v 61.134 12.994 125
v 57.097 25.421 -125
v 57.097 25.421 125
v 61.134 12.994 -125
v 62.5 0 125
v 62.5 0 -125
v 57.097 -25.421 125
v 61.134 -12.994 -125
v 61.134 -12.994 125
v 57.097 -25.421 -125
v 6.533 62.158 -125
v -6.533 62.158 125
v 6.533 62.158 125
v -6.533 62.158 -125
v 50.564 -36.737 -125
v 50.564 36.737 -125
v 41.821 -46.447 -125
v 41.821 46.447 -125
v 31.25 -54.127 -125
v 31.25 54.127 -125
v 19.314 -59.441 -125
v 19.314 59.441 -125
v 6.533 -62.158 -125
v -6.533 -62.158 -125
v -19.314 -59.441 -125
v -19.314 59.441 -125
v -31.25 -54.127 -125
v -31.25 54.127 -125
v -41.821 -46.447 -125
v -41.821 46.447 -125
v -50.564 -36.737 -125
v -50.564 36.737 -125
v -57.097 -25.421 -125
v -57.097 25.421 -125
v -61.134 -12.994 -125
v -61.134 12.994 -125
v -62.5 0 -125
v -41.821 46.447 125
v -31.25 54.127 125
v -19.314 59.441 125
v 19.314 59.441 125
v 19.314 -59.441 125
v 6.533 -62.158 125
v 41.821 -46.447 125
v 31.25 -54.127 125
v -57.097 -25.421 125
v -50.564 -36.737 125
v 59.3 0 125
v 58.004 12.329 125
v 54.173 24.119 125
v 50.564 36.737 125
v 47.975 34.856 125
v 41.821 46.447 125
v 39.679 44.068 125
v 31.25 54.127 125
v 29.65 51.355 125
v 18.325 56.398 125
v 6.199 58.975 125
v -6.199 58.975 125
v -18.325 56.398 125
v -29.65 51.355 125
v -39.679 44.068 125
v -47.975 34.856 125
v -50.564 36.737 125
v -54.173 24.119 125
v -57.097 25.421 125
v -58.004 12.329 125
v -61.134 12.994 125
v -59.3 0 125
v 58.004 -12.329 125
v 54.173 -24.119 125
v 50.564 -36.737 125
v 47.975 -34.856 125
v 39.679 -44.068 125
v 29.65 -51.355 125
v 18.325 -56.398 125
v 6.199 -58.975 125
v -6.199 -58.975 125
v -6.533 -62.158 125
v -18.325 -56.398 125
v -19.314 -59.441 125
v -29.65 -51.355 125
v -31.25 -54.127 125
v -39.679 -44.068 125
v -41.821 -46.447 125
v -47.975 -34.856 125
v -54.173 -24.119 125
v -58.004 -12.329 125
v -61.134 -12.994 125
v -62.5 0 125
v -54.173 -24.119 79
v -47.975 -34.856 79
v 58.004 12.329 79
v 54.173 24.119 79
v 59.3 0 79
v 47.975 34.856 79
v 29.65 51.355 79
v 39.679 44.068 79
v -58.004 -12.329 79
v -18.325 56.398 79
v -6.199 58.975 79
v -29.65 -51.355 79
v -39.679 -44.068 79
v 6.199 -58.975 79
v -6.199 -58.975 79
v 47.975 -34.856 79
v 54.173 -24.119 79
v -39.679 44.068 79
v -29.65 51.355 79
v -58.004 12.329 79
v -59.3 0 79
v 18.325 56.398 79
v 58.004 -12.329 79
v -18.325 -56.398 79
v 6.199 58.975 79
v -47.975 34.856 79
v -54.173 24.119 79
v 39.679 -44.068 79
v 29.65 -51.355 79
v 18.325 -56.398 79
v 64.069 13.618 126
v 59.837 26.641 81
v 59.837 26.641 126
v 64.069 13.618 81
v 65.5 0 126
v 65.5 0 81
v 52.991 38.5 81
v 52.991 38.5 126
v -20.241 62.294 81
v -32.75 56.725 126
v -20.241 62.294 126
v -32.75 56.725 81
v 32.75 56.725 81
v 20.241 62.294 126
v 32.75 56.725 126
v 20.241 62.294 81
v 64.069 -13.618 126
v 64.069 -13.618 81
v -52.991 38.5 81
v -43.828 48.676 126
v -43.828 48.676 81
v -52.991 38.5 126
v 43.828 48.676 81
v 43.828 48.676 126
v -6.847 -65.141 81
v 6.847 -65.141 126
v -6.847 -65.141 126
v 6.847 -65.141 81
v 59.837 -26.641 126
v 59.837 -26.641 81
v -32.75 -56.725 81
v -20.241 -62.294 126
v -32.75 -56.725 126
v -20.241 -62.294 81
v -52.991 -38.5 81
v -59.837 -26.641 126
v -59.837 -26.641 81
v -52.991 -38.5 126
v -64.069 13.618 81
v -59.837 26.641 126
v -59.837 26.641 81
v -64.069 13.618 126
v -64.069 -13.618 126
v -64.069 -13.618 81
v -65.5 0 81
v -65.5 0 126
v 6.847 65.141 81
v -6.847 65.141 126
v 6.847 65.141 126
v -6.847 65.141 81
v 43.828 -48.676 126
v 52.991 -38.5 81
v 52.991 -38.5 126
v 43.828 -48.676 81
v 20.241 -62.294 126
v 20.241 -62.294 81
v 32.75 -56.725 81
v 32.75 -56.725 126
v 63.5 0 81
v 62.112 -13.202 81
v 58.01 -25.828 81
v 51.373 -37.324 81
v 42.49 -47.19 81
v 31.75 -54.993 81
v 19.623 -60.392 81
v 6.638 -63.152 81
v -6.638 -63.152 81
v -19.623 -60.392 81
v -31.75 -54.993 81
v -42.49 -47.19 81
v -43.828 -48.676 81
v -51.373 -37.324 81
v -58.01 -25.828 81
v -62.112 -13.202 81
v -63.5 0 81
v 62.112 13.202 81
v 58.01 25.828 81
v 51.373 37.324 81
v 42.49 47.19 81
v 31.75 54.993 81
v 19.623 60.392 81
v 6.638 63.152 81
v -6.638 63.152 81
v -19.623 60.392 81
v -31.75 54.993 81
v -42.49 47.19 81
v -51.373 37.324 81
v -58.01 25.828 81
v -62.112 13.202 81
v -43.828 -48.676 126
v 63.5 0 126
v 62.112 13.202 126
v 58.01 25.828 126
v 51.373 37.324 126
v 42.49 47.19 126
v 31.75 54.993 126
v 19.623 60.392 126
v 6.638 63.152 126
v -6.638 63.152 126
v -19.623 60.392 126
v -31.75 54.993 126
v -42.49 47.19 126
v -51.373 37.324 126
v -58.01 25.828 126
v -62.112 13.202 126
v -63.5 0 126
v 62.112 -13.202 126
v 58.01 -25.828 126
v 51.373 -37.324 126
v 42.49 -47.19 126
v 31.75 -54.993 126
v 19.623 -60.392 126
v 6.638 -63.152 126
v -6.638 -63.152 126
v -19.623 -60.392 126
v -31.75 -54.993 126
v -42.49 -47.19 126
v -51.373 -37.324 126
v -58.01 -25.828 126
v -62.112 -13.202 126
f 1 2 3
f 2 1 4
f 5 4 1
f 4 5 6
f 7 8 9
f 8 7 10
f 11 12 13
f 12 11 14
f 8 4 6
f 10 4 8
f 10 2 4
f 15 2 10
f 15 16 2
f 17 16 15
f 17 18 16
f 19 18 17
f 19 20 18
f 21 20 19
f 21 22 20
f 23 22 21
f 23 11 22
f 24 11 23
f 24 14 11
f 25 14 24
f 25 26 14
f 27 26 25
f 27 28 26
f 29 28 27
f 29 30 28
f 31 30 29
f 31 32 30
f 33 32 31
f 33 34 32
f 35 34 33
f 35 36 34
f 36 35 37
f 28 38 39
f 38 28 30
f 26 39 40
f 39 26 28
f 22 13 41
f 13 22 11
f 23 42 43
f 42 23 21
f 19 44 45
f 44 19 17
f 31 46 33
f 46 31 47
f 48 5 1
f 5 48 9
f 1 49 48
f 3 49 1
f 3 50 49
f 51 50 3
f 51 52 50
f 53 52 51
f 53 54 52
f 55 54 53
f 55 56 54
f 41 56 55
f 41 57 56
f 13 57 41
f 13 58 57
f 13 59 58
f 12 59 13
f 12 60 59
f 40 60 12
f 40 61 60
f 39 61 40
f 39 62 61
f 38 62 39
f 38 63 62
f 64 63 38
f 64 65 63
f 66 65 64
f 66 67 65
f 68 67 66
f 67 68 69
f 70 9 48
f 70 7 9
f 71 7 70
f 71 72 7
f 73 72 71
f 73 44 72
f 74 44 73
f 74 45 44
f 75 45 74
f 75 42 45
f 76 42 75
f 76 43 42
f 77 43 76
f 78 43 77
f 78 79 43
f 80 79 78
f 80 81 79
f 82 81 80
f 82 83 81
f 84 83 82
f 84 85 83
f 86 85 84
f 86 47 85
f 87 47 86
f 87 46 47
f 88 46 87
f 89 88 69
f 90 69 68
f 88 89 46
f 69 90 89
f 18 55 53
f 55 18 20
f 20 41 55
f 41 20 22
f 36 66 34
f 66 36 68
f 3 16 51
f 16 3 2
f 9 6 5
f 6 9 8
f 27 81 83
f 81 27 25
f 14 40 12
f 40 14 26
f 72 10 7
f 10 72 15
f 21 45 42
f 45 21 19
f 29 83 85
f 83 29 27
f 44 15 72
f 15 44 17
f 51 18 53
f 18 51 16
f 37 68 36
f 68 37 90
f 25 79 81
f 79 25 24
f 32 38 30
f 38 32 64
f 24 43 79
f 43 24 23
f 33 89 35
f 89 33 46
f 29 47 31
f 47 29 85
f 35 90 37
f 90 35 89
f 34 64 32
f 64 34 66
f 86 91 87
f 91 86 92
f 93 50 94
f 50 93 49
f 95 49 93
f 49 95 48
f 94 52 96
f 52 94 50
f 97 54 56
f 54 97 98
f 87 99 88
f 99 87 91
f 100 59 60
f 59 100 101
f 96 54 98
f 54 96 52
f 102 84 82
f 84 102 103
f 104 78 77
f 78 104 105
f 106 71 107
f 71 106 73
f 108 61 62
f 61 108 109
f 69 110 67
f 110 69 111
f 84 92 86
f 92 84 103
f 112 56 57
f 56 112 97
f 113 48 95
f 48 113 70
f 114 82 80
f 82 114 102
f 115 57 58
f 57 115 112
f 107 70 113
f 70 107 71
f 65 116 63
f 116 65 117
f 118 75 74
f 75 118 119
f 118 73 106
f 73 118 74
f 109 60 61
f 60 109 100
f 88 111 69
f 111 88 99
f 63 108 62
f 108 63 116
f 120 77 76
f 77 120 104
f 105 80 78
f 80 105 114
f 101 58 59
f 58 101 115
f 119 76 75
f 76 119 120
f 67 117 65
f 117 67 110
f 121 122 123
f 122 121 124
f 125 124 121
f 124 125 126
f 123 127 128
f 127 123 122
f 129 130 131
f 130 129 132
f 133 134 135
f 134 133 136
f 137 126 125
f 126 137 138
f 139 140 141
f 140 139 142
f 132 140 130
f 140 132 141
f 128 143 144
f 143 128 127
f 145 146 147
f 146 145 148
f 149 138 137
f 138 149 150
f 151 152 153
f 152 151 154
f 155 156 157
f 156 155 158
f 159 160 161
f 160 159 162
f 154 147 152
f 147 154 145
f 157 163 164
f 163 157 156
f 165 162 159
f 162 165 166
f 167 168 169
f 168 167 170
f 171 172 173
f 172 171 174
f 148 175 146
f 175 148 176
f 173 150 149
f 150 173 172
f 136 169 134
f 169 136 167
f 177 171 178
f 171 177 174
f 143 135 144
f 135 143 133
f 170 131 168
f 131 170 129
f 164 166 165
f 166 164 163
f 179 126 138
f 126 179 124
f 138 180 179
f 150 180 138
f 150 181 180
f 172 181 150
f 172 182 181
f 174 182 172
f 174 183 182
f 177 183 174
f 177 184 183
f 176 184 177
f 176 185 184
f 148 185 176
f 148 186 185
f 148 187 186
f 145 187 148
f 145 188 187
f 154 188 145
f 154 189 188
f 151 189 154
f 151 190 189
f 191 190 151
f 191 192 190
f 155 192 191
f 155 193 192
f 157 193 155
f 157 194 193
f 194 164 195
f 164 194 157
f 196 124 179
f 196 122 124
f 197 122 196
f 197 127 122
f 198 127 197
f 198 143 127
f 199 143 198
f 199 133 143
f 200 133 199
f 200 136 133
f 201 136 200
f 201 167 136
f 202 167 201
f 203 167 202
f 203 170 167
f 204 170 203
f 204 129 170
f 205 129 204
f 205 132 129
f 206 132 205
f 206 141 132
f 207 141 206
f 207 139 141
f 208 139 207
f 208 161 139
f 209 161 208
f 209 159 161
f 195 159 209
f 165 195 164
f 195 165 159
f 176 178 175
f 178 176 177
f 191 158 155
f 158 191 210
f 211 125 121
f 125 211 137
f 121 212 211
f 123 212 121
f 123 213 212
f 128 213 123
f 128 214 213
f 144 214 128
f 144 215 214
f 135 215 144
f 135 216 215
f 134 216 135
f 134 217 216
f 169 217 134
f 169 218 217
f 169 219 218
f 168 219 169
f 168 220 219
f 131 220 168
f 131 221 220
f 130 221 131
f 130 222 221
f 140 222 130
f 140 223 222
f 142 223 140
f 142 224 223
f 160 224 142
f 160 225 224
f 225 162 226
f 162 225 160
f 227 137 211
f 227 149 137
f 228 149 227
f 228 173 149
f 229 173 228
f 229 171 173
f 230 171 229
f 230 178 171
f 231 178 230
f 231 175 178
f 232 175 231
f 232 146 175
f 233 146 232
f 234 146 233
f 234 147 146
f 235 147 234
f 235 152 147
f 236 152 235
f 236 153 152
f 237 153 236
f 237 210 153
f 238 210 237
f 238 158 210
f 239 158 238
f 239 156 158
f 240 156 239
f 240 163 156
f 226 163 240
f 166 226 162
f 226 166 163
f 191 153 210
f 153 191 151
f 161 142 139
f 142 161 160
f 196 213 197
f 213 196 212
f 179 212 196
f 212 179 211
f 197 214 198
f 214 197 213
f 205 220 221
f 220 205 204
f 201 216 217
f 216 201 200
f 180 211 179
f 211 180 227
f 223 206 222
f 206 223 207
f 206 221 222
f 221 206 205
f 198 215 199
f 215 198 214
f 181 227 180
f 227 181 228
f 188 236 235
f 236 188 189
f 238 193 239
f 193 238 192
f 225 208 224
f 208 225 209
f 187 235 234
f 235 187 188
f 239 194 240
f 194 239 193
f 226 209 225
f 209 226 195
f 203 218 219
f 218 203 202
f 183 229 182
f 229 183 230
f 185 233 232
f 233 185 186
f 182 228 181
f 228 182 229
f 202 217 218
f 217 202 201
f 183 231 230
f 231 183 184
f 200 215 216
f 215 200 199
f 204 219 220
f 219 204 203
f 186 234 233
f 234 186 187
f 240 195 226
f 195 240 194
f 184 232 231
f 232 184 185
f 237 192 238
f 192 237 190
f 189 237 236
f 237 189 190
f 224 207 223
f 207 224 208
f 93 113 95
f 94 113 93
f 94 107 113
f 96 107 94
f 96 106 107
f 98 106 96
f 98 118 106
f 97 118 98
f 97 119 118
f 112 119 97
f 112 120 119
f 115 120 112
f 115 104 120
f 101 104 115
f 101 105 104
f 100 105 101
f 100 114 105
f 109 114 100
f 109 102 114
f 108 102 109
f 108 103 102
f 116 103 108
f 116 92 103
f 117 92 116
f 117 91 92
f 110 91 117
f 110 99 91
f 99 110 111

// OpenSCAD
// Parameters
nominal_diameter_mm = 125; //[60:250:1]
length_mm = 250; //[125:500:1]
wall_thickness_mm = 3.2; //[1.6:6.4:0.1]
fit_length_mm = 45; //[25:90:1]
fit_wall_extra_mm = 2.0; //[0.8:5.0:0.1]
fit_od_extra_mm = 6.0; //[2.0:15.0:0.5]
socket_clearance_mm = 1.0; //[0.2:2.5:0.1]
stop_ring_thickness_mm = 2.0; //[0.8:5.0:0.1]
stop_ring_depth_mm = 3.0; //[1.0:8.0:0.1]
overlap_mm = 1.0; //[0.5:2.0:0.1]

// HT Pipe - complete geometry
module ht_pipe() {
  color([0.85, 0.85, 0.8]) {
    // Pipe body
    difference() {
      cylinder(h=length_mm, r=nominal_diameter_mm/2, center=true);
      translate([0, 0, 0])
        cylinder(h=length_mm + 2*overlap_mm, r=nominal_diameter_mm/2 - wall_thickness_mm, center=true);
    }
    
    // End fitting detail
    difference() {
      union() {
        translate([0, 0, length_mm/2 - fit_length_mm/2 + overlap_mm])
          cylinder(h=fit_length_mm, r=nominal_diameter_mm/2 + fit_od_extra_mm/2, center=true);
        translate([0, 0, 0])
          cylinder(h=length_mm, r=nominal_diameter_mm/2, center=true);
      }
      translate([0, 0, length_mm/2 - fit_length_mm/2 + overlap_mm])
        cylinder(h=fit_length_mm + 2*overlap_mm, r=nominal_diameter_mm/2 + socket_clearance_mm, center=true);
      translate([0, 0, length_mm/2 - fit_length_mm + stop_ring_thickness_mm/2])
        cylinder(h=stop_ring_thickness_mm + 2*overlap_mm, r=nominal_diameter_mm/2 + socket_clearance_mm - stop_ring_depth_mm, center=true);
    }
  }
}

// Assembly
module assembly() {
  ht_pipe();
}

assembly();
